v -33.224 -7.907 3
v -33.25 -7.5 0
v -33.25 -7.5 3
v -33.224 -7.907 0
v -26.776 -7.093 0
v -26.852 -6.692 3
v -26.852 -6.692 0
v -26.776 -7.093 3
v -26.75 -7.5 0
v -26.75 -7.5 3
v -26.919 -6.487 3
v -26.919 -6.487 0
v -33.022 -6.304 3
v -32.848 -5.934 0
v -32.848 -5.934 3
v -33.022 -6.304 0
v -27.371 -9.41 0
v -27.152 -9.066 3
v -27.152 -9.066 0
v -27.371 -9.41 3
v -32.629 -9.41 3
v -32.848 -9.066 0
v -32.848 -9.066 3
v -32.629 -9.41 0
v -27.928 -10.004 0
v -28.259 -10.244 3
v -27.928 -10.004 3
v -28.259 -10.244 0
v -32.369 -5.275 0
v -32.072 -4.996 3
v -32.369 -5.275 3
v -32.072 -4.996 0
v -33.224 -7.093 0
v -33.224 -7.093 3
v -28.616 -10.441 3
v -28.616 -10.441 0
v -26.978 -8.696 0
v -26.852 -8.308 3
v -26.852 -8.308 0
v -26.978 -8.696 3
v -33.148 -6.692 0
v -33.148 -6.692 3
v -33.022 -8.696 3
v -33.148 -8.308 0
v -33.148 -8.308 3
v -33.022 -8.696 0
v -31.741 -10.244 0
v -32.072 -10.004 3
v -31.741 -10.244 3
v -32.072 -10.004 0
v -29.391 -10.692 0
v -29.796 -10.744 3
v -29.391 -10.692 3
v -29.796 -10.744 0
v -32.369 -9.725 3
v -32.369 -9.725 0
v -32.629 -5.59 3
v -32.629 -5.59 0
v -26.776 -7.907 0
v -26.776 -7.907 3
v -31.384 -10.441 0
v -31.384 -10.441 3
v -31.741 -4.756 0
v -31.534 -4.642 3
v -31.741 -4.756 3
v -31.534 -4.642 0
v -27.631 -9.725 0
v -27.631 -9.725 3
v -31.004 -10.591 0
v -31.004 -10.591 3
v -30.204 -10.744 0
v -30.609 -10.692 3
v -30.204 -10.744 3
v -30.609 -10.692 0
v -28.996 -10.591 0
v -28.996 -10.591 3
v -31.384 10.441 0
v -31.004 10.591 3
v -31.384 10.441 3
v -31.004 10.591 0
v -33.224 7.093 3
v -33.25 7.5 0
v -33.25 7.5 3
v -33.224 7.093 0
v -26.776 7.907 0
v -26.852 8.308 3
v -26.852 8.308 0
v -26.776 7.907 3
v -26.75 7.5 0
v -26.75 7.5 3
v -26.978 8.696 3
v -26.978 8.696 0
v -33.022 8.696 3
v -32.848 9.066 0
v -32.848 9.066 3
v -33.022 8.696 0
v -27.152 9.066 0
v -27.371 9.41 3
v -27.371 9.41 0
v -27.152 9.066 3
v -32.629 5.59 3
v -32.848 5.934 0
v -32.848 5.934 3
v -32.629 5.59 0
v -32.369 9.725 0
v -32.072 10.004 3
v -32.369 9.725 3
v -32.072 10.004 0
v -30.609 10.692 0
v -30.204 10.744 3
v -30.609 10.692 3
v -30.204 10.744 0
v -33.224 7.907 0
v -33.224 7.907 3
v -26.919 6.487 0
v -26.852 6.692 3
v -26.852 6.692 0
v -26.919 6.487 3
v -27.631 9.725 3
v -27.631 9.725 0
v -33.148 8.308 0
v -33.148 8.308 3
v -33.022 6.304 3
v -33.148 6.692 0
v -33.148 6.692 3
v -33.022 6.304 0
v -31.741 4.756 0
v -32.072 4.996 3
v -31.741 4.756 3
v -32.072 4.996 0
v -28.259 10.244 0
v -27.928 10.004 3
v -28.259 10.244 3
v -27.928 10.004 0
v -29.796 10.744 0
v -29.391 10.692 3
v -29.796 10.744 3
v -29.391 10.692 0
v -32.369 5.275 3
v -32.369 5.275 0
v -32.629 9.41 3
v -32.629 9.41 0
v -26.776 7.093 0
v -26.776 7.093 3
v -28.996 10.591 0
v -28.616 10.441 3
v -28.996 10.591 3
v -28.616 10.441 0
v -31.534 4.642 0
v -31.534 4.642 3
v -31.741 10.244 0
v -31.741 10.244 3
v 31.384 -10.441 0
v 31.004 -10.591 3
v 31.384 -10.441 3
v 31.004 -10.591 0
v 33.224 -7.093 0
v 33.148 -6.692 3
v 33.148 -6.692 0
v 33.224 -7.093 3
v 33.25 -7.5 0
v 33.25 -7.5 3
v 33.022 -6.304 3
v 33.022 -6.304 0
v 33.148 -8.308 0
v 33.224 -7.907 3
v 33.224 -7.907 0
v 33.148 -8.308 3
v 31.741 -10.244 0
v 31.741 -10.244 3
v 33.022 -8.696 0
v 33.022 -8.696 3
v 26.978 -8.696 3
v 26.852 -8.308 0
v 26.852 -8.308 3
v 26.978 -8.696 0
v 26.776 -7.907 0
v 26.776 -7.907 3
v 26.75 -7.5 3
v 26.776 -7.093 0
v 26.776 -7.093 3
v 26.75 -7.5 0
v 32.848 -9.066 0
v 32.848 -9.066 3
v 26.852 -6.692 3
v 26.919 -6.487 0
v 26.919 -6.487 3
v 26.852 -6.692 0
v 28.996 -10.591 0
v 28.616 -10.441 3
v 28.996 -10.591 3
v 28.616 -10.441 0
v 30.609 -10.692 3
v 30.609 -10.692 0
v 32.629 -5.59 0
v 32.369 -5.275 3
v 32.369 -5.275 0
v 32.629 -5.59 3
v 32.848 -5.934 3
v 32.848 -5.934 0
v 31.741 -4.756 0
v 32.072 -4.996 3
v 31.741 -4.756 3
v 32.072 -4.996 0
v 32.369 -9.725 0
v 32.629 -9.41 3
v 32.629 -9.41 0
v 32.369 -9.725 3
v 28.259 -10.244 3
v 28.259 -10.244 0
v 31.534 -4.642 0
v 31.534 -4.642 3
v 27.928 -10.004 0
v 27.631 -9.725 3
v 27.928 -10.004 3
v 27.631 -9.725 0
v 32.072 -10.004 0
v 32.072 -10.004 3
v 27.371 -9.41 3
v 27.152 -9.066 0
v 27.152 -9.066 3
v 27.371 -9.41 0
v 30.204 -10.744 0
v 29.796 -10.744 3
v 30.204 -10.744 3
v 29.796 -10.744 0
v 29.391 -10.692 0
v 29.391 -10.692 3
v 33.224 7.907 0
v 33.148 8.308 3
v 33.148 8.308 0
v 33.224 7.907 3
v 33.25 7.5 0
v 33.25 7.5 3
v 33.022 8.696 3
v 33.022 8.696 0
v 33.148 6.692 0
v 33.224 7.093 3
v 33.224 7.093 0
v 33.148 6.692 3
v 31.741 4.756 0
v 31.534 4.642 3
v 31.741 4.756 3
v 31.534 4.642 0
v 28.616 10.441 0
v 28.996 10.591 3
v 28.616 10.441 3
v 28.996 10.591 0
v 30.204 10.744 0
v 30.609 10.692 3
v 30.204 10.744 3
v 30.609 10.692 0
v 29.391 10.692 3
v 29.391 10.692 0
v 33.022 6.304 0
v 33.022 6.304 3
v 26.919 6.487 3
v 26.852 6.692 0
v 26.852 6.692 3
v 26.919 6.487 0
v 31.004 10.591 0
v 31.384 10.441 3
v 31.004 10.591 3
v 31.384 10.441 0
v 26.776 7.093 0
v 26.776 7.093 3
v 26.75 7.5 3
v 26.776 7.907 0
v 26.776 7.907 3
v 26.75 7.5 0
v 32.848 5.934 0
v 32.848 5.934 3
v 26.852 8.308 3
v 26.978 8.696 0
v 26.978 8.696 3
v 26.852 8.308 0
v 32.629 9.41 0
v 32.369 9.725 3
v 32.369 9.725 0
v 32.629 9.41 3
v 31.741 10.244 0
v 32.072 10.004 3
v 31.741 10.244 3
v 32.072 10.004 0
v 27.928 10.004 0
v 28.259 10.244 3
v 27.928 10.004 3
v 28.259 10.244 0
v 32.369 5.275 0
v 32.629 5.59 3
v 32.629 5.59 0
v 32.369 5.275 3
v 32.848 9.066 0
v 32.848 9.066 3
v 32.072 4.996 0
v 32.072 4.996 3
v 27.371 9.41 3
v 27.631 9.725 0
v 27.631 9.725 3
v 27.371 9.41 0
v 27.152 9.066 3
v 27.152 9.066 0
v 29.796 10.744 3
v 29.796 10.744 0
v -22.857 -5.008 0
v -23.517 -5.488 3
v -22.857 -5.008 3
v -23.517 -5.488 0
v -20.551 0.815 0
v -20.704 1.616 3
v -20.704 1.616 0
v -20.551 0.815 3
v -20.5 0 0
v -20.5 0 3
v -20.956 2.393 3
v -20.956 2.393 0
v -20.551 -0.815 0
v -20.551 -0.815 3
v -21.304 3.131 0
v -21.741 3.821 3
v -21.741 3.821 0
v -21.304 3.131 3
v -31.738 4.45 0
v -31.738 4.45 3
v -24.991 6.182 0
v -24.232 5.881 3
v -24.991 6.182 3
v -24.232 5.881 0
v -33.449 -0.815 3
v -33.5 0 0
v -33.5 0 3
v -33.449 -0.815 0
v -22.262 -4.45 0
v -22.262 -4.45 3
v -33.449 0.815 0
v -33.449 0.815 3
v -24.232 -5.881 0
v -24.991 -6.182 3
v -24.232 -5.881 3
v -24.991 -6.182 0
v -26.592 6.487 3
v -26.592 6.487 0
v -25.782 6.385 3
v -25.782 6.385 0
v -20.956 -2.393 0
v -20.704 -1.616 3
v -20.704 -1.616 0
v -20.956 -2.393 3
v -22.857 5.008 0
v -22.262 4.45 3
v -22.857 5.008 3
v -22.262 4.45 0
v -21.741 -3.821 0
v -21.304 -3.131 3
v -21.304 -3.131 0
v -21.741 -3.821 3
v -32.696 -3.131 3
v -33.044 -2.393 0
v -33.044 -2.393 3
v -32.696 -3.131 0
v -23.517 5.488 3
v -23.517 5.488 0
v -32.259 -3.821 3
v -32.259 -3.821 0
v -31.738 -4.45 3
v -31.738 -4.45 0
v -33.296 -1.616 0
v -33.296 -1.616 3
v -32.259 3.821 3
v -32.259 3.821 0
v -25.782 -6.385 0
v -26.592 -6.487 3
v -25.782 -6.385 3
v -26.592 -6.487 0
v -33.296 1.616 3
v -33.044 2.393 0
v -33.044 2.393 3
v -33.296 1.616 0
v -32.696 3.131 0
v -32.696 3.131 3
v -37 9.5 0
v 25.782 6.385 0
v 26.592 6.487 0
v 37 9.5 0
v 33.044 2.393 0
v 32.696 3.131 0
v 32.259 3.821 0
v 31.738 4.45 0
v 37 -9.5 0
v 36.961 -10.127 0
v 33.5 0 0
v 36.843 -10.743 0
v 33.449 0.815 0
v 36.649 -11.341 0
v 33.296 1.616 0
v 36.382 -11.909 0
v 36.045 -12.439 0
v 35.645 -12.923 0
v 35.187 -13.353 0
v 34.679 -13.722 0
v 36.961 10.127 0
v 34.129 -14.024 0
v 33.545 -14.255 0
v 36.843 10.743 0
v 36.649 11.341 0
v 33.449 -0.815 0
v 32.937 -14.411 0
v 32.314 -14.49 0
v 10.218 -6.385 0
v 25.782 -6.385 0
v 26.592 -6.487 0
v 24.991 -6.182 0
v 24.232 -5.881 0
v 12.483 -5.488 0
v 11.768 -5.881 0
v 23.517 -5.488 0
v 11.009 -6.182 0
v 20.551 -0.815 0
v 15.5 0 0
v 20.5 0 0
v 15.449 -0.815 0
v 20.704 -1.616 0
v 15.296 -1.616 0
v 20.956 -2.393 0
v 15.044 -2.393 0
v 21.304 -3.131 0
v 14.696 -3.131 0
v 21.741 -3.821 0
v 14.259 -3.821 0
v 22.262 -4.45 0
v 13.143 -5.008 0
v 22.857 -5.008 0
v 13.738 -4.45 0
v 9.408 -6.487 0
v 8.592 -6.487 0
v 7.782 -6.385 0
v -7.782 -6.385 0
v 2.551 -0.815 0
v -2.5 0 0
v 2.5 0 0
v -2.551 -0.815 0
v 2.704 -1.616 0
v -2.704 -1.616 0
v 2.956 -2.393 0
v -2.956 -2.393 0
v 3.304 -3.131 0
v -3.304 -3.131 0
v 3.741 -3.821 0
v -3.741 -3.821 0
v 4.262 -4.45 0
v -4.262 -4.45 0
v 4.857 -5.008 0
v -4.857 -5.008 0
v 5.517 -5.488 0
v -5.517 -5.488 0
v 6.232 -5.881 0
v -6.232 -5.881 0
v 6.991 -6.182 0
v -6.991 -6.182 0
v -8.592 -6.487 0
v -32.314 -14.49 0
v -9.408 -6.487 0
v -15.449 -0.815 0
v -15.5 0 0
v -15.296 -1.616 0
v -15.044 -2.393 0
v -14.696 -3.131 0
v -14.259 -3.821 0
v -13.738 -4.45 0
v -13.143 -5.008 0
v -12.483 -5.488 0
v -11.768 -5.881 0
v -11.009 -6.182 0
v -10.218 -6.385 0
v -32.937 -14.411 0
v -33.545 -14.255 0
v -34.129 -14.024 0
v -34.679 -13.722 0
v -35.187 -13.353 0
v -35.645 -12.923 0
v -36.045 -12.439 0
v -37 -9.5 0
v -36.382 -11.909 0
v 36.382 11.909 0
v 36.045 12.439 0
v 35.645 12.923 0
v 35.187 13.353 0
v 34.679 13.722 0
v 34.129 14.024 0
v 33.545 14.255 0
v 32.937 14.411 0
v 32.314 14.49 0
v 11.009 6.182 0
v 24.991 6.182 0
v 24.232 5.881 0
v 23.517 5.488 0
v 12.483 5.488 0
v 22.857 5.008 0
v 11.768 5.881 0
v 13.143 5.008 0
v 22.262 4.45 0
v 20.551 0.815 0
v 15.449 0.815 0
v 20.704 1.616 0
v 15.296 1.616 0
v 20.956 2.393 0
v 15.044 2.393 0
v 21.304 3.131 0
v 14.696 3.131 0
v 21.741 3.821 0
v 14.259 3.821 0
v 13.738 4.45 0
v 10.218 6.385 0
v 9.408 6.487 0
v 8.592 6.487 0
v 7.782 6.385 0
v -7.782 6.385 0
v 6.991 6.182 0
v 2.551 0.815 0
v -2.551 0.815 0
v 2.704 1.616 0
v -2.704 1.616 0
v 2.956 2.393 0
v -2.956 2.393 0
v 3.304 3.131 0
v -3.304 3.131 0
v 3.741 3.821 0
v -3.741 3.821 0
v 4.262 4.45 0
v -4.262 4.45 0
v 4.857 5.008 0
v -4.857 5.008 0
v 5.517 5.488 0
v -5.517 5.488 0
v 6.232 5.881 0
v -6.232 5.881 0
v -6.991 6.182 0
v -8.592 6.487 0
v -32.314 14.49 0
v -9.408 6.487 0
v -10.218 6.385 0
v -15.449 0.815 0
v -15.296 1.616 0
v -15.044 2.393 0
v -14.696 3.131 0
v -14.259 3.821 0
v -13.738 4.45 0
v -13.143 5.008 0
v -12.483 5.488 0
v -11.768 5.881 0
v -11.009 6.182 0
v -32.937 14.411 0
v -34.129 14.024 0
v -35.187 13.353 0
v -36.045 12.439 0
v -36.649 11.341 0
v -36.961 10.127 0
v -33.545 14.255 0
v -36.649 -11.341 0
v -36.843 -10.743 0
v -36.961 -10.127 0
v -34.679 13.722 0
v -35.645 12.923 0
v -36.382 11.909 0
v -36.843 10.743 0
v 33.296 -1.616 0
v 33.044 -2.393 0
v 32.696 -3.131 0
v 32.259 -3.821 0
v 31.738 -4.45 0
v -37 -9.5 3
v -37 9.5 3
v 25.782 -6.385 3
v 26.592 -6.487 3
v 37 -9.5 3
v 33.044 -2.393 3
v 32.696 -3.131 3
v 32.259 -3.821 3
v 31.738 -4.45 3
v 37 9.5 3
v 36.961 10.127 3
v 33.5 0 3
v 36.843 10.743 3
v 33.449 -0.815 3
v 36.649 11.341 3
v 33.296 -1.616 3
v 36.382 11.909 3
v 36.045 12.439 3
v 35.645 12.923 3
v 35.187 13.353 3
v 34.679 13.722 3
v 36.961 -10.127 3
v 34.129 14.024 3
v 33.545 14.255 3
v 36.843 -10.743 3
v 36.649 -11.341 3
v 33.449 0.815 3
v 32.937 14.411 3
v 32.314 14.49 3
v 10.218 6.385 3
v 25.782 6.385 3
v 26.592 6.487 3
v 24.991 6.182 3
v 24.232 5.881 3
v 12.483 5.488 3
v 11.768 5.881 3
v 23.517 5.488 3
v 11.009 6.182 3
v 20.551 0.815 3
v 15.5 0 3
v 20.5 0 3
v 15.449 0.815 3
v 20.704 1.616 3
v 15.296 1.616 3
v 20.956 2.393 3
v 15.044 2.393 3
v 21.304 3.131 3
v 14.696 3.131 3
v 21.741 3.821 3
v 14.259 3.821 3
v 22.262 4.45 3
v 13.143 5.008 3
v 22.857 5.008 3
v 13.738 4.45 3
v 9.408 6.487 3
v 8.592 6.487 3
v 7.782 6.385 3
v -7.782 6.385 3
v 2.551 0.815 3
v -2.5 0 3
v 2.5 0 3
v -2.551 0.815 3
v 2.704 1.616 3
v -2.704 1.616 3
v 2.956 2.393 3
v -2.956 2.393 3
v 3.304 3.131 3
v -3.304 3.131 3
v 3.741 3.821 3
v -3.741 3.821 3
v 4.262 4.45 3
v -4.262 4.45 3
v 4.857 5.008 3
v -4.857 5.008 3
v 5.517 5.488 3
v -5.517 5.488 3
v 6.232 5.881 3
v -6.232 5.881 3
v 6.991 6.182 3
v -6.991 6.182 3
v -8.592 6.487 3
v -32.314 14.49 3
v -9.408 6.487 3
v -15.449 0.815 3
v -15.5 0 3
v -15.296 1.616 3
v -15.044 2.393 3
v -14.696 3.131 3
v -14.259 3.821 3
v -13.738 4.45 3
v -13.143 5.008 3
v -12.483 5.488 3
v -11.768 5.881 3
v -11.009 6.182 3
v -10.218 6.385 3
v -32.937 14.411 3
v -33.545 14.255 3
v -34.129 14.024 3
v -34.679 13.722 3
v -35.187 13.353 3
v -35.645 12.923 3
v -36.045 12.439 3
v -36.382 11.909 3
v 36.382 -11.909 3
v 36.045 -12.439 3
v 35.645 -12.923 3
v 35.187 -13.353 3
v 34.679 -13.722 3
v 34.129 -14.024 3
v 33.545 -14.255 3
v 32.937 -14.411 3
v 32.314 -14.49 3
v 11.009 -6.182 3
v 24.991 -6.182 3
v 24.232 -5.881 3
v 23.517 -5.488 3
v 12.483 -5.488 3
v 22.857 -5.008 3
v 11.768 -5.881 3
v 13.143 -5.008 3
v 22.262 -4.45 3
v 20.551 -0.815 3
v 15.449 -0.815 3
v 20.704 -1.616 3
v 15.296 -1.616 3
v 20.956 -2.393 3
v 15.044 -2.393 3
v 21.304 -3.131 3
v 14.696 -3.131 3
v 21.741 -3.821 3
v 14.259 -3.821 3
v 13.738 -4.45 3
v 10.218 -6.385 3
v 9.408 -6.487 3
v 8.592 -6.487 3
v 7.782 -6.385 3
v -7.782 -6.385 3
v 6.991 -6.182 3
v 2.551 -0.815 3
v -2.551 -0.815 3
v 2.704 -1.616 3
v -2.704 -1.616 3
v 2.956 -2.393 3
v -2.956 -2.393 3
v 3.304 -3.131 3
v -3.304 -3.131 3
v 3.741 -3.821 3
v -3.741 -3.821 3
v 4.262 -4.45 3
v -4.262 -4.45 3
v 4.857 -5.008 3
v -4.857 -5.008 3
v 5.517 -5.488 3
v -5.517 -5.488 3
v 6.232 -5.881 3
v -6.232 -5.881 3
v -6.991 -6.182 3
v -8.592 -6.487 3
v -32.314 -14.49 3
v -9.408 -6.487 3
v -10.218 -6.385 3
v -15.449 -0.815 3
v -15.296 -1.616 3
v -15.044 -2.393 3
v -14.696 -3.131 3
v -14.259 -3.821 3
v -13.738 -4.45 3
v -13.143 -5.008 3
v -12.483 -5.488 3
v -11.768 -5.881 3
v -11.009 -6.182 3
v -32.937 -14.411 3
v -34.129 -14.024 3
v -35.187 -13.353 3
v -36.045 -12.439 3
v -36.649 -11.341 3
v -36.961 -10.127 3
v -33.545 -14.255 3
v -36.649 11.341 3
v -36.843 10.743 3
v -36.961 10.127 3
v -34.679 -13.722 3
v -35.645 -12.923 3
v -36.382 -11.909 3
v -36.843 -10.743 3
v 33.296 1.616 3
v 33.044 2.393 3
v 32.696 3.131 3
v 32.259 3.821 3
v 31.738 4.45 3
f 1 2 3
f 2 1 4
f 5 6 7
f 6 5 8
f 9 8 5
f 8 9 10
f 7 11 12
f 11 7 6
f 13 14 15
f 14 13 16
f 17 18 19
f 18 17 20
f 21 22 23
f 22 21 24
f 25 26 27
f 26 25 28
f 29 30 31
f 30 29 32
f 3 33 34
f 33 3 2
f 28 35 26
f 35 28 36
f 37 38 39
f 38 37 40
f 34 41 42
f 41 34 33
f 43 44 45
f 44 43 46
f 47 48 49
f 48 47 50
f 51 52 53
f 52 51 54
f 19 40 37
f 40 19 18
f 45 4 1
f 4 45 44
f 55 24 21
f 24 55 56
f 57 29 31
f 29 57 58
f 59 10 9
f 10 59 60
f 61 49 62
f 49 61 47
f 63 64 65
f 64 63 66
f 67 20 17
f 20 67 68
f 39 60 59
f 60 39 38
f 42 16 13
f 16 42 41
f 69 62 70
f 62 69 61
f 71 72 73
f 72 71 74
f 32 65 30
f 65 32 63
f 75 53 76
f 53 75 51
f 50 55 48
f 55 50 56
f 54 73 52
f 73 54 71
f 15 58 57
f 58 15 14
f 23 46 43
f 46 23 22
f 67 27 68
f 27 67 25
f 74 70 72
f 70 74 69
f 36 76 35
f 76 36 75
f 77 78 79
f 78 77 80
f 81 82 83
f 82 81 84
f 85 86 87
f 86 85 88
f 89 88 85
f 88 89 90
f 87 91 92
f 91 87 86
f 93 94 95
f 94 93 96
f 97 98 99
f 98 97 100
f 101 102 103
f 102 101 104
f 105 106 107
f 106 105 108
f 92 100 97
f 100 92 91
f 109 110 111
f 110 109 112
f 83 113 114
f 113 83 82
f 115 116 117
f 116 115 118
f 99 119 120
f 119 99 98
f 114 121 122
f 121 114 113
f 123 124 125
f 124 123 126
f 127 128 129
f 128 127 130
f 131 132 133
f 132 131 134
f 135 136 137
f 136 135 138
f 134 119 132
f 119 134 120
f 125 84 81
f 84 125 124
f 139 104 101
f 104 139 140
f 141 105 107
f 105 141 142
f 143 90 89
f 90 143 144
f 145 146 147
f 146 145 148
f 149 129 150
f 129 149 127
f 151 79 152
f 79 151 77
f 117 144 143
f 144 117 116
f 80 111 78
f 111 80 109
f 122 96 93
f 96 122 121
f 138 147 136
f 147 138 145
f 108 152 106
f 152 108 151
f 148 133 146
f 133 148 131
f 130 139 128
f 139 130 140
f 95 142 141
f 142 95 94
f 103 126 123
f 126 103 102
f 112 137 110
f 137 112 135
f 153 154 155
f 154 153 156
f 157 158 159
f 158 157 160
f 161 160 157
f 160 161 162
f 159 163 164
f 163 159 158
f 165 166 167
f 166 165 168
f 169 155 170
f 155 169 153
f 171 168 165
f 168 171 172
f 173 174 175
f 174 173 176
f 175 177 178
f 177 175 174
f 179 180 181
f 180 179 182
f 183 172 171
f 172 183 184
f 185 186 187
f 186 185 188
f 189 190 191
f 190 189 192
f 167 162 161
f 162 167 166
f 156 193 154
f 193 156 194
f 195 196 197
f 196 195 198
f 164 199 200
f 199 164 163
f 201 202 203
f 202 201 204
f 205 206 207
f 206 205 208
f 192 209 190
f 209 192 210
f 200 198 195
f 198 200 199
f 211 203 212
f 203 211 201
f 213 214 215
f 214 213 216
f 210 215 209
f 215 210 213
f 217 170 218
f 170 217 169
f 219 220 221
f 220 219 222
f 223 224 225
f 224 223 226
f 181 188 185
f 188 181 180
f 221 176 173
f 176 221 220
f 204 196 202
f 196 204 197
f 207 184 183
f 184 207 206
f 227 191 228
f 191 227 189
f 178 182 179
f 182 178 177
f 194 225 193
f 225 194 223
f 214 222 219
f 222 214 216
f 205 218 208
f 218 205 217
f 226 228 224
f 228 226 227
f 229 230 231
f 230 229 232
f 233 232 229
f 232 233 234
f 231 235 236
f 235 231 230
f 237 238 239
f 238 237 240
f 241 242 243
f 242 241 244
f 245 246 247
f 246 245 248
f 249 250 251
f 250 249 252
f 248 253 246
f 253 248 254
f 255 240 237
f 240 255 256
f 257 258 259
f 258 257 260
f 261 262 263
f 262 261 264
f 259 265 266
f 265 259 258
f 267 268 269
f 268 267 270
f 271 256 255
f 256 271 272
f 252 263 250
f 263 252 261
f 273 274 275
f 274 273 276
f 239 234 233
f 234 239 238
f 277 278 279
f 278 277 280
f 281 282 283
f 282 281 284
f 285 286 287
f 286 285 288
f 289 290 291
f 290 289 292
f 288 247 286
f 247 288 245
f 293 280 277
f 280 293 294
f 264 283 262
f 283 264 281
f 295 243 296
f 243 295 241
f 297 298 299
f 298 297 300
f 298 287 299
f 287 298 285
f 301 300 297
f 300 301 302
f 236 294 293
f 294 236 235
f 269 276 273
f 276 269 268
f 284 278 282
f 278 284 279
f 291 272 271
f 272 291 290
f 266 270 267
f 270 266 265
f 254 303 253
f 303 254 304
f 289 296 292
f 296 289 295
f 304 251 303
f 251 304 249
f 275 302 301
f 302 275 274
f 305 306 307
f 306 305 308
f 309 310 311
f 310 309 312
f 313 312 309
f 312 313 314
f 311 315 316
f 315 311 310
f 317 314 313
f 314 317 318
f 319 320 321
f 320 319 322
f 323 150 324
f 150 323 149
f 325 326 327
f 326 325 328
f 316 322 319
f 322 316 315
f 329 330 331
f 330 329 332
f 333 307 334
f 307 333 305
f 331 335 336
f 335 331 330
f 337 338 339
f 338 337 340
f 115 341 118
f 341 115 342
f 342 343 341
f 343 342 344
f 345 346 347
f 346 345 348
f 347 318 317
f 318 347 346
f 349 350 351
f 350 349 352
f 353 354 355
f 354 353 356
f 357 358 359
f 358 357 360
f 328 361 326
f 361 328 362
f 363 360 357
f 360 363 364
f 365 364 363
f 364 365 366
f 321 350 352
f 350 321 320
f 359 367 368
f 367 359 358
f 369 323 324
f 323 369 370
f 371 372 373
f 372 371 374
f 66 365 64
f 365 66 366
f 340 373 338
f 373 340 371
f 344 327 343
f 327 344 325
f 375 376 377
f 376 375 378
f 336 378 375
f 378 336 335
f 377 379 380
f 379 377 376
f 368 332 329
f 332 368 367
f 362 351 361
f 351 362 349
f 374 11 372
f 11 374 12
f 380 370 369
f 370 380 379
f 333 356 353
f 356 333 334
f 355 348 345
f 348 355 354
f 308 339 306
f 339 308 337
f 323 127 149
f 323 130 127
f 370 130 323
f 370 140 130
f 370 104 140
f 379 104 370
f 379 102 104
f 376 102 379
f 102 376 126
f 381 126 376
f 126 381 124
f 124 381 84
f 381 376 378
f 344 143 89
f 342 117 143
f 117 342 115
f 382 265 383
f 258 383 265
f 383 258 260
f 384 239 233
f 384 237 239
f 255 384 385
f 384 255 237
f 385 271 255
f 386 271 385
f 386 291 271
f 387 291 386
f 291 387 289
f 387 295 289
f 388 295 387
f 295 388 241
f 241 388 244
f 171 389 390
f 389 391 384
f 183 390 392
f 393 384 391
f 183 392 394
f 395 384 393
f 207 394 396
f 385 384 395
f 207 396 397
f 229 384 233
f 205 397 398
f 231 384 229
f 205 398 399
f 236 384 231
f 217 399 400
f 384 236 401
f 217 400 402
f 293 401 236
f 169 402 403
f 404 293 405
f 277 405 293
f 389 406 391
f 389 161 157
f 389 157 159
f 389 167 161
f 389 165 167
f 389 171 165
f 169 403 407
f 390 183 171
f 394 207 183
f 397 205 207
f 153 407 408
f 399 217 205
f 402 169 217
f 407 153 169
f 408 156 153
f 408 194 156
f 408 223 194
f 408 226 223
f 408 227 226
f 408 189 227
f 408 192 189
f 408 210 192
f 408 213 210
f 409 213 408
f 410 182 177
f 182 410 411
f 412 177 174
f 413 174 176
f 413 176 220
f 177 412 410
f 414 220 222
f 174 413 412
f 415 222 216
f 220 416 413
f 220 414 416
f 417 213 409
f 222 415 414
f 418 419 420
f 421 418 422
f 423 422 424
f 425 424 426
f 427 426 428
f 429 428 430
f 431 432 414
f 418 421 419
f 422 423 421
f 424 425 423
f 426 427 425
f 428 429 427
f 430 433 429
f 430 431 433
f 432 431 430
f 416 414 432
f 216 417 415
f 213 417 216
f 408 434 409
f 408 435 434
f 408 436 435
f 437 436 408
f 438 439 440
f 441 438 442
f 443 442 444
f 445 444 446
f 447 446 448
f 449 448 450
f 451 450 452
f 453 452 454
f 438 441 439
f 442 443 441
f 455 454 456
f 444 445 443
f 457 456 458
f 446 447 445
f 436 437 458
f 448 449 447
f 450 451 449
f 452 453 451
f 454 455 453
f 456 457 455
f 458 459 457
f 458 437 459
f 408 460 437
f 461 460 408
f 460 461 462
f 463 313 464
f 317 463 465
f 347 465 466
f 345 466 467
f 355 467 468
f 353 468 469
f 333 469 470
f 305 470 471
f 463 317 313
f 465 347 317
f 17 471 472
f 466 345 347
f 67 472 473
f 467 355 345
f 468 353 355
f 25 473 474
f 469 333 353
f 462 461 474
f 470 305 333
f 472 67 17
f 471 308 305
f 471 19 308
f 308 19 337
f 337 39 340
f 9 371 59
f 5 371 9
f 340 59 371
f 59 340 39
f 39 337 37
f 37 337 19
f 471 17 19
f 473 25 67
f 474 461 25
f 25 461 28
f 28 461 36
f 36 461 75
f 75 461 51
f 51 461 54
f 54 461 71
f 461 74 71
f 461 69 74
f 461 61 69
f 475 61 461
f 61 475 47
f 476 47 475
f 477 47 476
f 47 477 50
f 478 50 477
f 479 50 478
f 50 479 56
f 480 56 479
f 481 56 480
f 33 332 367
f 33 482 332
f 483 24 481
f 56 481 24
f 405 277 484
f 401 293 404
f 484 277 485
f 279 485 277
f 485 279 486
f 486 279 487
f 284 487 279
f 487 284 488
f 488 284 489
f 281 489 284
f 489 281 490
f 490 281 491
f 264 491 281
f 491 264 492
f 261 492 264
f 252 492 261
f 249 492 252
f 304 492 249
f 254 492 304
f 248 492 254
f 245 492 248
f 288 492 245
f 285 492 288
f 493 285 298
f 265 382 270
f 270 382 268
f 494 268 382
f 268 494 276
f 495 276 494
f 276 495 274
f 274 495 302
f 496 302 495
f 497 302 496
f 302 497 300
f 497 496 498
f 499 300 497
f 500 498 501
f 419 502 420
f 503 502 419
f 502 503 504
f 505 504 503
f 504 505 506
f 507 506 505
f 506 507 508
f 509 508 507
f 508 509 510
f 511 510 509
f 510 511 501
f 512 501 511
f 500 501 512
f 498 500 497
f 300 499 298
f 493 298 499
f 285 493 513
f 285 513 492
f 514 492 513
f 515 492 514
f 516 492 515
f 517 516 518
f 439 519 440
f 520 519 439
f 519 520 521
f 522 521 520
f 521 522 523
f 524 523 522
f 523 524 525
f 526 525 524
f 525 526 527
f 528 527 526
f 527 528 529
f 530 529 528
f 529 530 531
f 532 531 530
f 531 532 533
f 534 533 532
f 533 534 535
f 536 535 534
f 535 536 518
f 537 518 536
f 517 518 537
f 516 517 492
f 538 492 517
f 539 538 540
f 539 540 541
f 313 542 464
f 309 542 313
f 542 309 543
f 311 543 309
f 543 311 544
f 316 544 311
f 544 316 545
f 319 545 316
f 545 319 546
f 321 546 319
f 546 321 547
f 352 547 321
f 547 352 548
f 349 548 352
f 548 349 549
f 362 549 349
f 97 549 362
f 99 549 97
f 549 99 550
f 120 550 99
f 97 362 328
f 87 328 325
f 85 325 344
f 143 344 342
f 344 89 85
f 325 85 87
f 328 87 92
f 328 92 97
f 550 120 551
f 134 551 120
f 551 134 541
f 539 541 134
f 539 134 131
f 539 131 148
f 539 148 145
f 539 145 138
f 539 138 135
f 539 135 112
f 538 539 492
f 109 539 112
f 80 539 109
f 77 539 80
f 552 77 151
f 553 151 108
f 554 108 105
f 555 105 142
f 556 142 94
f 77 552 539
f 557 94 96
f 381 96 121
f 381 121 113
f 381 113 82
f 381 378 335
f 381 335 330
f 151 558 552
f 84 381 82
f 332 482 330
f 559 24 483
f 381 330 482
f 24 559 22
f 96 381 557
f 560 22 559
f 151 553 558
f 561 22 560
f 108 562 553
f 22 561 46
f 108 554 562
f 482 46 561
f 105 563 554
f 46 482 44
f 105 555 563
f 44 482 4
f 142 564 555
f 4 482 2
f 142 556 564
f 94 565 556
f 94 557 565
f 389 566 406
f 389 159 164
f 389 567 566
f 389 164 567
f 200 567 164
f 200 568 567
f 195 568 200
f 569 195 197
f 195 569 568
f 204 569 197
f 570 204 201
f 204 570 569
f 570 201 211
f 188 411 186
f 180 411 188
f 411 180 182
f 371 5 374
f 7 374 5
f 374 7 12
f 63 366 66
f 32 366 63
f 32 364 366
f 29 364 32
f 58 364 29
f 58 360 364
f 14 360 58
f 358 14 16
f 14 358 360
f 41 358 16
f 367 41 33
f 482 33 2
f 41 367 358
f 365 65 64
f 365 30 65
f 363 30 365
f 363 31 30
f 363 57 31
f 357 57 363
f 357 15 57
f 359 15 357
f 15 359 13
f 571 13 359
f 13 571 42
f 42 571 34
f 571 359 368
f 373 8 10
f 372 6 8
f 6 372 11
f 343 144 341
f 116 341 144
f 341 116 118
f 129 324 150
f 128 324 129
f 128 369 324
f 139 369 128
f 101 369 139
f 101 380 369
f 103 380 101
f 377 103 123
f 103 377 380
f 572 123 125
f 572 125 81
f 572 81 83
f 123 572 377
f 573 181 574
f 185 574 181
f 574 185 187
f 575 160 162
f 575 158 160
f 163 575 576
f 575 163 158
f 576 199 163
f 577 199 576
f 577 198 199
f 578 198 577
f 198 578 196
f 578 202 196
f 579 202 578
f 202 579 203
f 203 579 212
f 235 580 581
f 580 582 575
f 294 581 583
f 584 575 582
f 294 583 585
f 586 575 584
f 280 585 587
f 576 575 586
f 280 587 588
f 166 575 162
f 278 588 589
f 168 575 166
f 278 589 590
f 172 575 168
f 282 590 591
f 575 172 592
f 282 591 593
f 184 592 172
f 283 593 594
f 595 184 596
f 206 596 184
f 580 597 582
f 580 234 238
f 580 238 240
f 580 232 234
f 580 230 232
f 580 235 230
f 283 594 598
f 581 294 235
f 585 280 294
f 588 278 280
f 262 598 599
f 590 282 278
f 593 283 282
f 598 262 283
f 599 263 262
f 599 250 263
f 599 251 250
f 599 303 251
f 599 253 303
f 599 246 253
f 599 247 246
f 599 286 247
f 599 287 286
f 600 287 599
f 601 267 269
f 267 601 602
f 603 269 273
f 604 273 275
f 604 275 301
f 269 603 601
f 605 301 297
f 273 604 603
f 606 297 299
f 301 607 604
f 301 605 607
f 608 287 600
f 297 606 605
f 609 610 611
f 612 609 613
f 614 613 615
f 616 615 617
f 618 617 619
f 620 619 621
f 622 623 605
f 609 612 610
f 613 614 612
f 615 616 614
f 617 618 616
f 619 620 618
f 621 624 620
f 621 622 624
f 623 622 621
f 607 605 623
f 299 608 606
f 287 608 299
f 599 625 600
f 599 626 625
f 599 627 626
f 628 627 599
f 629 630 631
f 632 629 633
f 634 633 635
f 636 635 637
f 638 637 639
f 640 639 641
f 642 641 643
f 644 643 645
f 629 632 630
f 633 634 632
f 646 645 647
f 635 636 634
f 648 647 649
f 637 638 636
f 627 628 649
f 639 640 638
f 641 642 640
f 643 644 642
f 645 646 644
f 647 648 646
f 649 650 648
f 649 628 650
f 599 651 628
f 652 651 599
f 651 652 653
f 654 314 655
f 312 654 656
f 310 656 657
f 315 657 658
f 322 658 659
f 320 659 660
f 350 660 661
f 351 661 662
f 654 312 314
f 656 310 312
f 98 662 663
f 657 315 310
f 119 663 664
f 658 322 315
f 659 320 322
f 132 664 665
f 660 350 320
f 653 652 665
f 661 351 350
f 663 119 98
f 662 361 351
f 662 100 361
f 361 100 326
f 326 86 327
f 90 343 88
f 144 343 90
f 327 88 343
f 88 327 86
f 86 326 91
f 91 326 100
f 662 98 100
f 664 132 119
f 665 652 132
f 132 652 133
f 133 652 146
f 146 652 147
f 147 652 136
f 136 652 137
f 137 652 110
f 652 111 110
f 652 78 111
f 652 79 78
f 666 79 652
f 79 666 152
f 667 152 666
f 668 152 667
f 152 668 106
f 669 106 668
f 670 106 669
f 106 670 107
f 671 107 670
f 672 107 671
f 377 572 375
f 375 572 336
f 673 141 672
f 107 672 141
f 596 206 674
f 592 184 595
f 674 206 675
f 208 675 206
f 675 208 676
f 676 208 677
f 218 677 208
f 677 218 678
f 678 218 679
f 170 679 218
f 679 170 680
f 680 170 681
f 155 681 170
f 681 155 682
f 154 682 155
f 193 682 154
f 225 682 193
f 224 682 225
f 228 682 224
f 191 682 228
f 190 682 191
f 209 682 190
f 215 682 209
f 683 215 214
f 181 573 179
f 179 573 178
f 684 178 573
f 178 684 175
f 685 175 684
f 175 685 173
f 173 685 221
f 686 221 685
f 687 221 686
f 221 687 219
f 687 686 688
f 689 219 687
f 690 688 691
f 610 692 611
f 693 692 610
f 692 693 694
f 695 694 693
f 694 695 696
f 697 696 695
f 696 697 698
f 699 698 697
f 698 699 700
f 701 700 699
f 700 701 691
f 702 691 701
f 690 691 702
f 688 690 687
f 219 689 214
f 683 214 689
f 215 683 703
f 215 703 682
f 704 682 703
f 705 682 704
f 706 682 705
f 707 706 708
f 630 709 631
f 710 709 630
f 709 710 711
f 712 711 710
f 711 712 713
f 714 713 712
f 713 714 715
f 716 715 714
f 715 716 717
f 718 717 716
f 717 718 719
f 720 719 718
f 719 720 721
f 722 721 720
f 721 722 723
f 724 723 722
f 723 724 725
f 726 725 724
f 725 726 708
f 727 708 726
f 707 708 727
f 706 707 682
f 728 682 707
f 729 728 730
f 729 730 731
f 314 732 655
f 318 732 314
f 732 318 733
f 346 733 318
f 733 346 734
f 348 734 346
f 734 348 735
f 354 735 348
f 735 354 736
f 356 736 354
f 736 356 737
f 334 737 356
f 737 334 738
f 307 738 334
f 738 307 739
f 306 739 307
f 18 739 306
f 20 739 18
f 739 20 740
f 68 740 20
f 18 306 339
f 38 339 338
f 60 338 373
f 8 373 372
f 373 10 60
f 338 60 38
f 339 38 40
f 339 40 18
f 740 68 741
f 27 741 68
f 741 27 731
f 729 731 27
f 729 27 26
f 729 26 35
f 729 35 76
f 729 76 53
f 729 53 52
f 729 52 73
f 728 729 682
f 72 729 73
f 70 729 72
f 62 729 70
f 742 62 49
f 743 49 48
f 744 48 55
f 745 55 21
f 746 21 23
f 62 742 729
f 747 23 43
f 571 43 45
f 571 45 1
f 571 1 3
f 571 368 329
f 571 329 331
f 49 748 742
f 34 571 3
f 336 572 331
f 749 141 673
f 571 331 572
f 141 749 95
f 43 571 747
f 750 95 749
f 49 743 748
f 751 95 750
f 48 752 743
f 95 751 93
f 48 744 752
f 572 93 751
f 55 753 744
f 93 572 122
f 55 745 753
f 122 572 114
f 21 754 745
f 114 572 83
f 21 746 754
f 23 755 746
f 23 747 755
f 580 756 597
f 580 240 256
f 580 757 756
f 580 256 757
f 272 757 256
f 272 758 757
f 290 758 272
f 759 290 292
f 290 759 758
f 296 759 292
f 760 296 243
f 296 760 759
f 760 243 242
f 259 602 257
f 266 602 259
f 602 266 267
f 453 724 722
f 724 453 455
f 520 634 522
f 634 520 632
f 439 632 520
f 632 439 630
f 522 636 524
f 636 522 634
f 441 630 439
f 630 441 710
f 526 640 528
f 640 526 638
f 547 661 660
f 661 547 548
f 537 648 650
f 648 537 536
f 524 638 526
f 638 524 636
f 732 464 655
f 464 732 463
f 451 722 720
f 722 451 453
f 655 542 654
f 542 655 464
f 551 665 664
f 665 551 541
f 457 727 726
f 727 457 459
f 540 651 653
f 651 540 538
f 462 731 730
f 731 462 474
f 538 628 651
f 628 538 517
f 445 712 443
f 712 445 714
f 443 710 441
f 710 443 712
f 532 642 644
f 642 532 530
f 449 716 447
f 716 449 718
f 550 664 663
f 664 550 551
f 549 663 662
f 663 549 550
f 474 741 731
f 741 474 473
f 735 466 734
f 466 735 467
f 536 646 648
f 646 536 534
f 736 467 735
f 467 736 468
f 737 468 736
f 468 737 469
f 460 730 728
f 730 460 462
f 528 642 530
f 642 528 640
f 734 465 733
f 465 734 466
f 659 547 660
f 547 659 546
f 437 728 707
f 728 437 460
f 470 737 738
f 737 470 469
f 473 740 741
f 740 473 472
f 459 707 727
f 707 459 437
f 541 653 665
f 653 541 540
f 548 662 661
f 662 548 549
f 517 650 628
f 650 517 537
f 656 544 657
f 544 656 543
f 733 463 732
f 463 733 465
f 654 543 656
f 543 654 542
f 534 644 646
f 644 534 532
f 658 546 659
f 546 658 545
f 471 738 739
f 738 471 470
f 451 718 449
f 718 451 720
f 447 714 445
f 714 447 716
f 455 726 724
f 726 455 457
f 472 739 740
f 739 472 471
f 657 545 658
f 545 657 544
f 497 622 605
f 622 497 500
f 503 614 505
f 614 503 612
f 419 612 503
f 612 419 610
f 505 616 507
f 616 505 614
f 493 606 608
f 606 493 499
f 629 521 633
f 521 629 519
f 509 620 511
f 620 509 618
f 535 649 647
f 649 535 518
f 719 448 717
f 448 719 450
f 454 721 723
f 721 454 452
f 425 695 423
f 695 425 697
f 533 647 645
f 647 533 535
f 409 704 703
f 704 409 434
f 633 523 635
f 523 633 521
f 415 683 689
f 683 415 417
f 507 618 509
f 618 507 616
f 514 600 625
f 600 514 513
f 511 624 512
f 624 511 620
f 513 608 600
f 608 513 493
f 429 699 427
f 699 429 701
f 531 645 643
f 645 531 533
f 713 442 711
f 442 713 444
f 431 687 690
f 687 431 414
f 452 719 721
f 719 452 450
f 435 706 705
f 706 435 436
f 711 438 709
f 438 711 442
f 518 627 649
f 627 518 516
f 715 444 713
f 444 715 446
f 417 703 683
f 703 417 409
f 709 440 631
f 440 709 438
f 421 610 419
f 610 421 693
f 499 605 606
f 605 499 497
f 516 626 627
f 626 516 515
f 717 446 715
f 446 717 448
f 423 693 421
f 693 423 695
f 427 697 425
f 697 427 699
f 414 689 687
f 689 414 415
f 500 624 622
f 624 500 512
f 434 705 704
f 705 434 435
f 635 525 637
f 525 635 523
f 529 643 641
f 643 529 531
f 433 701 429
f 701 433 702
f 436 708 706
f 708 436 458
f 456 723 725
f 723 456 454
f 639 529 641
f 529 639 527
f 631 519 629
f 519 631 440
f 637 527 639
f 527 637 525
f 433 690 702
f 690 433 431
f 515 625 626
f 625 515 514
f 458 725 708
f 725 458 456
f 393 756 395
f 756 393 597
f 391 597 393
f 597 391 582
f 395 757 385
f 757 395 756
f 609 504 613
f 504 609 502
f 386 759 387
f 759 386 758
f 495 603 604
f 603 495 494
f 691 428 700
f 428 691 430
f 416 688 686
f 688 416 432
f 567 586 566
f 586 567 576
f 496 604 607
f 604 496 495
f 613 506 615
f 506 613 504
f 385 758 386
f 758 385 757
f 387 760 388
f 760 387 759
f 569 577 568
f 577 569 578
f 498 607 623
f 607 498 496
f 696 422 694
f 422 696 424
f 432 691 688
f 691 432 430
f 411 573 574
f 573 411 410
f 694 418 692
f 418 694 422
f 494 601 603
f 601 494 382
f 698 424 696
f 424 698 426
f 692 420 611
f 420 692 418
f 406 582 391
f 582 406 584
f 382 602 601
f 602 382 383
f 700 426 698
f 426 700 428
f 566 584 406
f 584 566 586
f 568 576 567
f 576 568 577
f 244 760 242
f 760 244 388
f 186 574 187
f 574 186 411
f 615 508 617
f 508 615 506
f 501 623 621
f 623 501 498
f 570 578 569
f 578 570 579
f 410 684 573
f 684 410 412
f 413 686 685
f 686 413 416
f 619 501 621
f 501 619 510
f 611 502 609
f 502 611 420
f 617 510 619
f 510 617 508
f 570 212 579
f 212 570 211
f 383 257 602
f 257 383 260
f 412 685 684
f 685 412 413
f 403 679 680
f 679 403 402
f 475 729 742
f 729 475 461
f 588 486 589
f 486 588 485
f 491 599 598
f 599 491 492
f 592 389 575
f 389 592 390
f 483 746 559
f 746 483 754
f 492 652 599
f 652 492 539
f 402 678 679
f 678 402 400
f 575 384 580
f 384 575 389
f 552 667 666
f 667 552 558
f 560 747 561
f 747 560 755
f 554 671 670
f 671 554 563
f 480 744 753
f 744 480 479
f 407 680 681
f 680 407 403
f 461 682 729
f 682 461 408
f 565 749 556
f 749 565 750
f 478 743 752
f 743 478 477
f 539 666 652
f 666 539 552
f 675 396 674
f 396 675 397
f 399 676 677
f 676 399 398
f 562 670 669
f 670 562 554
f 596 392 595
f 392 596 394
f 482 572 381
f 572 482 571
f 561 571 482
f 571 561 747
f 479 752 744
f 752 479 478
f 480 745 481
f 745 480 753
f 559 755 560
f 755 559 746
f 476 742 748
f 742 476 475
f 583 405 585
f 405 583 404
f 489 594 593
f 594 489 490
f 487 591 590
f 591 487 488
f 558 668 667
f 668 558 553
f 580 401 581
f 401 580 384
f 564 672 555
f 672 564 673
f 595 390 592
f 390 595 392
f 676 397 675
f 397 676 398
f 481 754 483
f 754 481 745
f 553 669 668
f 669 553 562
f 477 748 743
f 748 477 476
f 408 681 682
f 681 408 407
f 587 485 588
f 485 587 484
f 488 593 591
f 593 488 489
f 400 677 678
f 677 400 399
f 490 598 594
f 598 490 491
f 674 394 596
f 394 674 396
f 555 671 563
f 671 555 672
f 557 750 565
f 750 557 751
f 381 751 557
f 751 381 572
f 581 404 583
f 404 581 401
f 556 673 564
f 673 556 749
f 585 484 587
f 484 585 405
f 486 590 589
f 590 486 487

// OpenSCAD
$fn = 50;

difference() {
	union() {
		hull() {
			translate(v = [-32.0, 9.5, 0]) {
				cylinder(h = 3, r = 5);
			}
			translate(v = [32.0, 9.5, 0]) {
				cylinder(h = 3, r = 5);
			}
			translate(v = [-32.0, -9.5, 0]) {
				cylinder(h = 3, r = 5);
			}
			translate(v = [32.0, -9.5, 0]) {
				cylinder(h = 3, r = 5);
			}
		}
	}
	union() {
		translate(v = [-30.0, -7.5, -100.0]) {
			cylinder(h = 200, r = 3.25);
		}
		translate(v = [-30.0, 7.5, -100.0]) {
			cylinder(h = 200, r = 3.25);
		}
		translate(v = [30.0, -7.5, -100.0]) {
			cylinder(h = 200, r = 3.25);
		}
		translate(v = [30.0, 7.5, -100.0]) {
			cylinder(h = 200, r = 3.25);
		}
		translate(v = [-30.0, -7.5, -100.0]) {
			cylinder(h = 200, r = 1.8);
		}
		translate(v = [-30.0, 7.5, -100.0]) {
			cylinder(h = 200, r = 1.8);
		}
		translate(v = [30.0, -7.5, -100.0]) {
			cylinder(h = 200, r = 1.8);
		}
		translate(v = [30.0, 7.5, -100.0]) {
			cylinder(h = 200, r = 1.8);
		}
		translate(v = [-27.0, 0, 0.0]) {
			cylinder(h = 3, r = 6.5);
		}
		translate(v = [-9.0, 0, 0.0]) {
			cylinder(h = 3, r = 6.5);
		}
		translate(v = [9.0, 0, 0.0]) {
			cylinder(h = 3, r = 6.5);
		}
		translate(v = [27.0, 0, 0.0]) {
			cylinder(h = 3, r = 6.5);
		}
	}
}
